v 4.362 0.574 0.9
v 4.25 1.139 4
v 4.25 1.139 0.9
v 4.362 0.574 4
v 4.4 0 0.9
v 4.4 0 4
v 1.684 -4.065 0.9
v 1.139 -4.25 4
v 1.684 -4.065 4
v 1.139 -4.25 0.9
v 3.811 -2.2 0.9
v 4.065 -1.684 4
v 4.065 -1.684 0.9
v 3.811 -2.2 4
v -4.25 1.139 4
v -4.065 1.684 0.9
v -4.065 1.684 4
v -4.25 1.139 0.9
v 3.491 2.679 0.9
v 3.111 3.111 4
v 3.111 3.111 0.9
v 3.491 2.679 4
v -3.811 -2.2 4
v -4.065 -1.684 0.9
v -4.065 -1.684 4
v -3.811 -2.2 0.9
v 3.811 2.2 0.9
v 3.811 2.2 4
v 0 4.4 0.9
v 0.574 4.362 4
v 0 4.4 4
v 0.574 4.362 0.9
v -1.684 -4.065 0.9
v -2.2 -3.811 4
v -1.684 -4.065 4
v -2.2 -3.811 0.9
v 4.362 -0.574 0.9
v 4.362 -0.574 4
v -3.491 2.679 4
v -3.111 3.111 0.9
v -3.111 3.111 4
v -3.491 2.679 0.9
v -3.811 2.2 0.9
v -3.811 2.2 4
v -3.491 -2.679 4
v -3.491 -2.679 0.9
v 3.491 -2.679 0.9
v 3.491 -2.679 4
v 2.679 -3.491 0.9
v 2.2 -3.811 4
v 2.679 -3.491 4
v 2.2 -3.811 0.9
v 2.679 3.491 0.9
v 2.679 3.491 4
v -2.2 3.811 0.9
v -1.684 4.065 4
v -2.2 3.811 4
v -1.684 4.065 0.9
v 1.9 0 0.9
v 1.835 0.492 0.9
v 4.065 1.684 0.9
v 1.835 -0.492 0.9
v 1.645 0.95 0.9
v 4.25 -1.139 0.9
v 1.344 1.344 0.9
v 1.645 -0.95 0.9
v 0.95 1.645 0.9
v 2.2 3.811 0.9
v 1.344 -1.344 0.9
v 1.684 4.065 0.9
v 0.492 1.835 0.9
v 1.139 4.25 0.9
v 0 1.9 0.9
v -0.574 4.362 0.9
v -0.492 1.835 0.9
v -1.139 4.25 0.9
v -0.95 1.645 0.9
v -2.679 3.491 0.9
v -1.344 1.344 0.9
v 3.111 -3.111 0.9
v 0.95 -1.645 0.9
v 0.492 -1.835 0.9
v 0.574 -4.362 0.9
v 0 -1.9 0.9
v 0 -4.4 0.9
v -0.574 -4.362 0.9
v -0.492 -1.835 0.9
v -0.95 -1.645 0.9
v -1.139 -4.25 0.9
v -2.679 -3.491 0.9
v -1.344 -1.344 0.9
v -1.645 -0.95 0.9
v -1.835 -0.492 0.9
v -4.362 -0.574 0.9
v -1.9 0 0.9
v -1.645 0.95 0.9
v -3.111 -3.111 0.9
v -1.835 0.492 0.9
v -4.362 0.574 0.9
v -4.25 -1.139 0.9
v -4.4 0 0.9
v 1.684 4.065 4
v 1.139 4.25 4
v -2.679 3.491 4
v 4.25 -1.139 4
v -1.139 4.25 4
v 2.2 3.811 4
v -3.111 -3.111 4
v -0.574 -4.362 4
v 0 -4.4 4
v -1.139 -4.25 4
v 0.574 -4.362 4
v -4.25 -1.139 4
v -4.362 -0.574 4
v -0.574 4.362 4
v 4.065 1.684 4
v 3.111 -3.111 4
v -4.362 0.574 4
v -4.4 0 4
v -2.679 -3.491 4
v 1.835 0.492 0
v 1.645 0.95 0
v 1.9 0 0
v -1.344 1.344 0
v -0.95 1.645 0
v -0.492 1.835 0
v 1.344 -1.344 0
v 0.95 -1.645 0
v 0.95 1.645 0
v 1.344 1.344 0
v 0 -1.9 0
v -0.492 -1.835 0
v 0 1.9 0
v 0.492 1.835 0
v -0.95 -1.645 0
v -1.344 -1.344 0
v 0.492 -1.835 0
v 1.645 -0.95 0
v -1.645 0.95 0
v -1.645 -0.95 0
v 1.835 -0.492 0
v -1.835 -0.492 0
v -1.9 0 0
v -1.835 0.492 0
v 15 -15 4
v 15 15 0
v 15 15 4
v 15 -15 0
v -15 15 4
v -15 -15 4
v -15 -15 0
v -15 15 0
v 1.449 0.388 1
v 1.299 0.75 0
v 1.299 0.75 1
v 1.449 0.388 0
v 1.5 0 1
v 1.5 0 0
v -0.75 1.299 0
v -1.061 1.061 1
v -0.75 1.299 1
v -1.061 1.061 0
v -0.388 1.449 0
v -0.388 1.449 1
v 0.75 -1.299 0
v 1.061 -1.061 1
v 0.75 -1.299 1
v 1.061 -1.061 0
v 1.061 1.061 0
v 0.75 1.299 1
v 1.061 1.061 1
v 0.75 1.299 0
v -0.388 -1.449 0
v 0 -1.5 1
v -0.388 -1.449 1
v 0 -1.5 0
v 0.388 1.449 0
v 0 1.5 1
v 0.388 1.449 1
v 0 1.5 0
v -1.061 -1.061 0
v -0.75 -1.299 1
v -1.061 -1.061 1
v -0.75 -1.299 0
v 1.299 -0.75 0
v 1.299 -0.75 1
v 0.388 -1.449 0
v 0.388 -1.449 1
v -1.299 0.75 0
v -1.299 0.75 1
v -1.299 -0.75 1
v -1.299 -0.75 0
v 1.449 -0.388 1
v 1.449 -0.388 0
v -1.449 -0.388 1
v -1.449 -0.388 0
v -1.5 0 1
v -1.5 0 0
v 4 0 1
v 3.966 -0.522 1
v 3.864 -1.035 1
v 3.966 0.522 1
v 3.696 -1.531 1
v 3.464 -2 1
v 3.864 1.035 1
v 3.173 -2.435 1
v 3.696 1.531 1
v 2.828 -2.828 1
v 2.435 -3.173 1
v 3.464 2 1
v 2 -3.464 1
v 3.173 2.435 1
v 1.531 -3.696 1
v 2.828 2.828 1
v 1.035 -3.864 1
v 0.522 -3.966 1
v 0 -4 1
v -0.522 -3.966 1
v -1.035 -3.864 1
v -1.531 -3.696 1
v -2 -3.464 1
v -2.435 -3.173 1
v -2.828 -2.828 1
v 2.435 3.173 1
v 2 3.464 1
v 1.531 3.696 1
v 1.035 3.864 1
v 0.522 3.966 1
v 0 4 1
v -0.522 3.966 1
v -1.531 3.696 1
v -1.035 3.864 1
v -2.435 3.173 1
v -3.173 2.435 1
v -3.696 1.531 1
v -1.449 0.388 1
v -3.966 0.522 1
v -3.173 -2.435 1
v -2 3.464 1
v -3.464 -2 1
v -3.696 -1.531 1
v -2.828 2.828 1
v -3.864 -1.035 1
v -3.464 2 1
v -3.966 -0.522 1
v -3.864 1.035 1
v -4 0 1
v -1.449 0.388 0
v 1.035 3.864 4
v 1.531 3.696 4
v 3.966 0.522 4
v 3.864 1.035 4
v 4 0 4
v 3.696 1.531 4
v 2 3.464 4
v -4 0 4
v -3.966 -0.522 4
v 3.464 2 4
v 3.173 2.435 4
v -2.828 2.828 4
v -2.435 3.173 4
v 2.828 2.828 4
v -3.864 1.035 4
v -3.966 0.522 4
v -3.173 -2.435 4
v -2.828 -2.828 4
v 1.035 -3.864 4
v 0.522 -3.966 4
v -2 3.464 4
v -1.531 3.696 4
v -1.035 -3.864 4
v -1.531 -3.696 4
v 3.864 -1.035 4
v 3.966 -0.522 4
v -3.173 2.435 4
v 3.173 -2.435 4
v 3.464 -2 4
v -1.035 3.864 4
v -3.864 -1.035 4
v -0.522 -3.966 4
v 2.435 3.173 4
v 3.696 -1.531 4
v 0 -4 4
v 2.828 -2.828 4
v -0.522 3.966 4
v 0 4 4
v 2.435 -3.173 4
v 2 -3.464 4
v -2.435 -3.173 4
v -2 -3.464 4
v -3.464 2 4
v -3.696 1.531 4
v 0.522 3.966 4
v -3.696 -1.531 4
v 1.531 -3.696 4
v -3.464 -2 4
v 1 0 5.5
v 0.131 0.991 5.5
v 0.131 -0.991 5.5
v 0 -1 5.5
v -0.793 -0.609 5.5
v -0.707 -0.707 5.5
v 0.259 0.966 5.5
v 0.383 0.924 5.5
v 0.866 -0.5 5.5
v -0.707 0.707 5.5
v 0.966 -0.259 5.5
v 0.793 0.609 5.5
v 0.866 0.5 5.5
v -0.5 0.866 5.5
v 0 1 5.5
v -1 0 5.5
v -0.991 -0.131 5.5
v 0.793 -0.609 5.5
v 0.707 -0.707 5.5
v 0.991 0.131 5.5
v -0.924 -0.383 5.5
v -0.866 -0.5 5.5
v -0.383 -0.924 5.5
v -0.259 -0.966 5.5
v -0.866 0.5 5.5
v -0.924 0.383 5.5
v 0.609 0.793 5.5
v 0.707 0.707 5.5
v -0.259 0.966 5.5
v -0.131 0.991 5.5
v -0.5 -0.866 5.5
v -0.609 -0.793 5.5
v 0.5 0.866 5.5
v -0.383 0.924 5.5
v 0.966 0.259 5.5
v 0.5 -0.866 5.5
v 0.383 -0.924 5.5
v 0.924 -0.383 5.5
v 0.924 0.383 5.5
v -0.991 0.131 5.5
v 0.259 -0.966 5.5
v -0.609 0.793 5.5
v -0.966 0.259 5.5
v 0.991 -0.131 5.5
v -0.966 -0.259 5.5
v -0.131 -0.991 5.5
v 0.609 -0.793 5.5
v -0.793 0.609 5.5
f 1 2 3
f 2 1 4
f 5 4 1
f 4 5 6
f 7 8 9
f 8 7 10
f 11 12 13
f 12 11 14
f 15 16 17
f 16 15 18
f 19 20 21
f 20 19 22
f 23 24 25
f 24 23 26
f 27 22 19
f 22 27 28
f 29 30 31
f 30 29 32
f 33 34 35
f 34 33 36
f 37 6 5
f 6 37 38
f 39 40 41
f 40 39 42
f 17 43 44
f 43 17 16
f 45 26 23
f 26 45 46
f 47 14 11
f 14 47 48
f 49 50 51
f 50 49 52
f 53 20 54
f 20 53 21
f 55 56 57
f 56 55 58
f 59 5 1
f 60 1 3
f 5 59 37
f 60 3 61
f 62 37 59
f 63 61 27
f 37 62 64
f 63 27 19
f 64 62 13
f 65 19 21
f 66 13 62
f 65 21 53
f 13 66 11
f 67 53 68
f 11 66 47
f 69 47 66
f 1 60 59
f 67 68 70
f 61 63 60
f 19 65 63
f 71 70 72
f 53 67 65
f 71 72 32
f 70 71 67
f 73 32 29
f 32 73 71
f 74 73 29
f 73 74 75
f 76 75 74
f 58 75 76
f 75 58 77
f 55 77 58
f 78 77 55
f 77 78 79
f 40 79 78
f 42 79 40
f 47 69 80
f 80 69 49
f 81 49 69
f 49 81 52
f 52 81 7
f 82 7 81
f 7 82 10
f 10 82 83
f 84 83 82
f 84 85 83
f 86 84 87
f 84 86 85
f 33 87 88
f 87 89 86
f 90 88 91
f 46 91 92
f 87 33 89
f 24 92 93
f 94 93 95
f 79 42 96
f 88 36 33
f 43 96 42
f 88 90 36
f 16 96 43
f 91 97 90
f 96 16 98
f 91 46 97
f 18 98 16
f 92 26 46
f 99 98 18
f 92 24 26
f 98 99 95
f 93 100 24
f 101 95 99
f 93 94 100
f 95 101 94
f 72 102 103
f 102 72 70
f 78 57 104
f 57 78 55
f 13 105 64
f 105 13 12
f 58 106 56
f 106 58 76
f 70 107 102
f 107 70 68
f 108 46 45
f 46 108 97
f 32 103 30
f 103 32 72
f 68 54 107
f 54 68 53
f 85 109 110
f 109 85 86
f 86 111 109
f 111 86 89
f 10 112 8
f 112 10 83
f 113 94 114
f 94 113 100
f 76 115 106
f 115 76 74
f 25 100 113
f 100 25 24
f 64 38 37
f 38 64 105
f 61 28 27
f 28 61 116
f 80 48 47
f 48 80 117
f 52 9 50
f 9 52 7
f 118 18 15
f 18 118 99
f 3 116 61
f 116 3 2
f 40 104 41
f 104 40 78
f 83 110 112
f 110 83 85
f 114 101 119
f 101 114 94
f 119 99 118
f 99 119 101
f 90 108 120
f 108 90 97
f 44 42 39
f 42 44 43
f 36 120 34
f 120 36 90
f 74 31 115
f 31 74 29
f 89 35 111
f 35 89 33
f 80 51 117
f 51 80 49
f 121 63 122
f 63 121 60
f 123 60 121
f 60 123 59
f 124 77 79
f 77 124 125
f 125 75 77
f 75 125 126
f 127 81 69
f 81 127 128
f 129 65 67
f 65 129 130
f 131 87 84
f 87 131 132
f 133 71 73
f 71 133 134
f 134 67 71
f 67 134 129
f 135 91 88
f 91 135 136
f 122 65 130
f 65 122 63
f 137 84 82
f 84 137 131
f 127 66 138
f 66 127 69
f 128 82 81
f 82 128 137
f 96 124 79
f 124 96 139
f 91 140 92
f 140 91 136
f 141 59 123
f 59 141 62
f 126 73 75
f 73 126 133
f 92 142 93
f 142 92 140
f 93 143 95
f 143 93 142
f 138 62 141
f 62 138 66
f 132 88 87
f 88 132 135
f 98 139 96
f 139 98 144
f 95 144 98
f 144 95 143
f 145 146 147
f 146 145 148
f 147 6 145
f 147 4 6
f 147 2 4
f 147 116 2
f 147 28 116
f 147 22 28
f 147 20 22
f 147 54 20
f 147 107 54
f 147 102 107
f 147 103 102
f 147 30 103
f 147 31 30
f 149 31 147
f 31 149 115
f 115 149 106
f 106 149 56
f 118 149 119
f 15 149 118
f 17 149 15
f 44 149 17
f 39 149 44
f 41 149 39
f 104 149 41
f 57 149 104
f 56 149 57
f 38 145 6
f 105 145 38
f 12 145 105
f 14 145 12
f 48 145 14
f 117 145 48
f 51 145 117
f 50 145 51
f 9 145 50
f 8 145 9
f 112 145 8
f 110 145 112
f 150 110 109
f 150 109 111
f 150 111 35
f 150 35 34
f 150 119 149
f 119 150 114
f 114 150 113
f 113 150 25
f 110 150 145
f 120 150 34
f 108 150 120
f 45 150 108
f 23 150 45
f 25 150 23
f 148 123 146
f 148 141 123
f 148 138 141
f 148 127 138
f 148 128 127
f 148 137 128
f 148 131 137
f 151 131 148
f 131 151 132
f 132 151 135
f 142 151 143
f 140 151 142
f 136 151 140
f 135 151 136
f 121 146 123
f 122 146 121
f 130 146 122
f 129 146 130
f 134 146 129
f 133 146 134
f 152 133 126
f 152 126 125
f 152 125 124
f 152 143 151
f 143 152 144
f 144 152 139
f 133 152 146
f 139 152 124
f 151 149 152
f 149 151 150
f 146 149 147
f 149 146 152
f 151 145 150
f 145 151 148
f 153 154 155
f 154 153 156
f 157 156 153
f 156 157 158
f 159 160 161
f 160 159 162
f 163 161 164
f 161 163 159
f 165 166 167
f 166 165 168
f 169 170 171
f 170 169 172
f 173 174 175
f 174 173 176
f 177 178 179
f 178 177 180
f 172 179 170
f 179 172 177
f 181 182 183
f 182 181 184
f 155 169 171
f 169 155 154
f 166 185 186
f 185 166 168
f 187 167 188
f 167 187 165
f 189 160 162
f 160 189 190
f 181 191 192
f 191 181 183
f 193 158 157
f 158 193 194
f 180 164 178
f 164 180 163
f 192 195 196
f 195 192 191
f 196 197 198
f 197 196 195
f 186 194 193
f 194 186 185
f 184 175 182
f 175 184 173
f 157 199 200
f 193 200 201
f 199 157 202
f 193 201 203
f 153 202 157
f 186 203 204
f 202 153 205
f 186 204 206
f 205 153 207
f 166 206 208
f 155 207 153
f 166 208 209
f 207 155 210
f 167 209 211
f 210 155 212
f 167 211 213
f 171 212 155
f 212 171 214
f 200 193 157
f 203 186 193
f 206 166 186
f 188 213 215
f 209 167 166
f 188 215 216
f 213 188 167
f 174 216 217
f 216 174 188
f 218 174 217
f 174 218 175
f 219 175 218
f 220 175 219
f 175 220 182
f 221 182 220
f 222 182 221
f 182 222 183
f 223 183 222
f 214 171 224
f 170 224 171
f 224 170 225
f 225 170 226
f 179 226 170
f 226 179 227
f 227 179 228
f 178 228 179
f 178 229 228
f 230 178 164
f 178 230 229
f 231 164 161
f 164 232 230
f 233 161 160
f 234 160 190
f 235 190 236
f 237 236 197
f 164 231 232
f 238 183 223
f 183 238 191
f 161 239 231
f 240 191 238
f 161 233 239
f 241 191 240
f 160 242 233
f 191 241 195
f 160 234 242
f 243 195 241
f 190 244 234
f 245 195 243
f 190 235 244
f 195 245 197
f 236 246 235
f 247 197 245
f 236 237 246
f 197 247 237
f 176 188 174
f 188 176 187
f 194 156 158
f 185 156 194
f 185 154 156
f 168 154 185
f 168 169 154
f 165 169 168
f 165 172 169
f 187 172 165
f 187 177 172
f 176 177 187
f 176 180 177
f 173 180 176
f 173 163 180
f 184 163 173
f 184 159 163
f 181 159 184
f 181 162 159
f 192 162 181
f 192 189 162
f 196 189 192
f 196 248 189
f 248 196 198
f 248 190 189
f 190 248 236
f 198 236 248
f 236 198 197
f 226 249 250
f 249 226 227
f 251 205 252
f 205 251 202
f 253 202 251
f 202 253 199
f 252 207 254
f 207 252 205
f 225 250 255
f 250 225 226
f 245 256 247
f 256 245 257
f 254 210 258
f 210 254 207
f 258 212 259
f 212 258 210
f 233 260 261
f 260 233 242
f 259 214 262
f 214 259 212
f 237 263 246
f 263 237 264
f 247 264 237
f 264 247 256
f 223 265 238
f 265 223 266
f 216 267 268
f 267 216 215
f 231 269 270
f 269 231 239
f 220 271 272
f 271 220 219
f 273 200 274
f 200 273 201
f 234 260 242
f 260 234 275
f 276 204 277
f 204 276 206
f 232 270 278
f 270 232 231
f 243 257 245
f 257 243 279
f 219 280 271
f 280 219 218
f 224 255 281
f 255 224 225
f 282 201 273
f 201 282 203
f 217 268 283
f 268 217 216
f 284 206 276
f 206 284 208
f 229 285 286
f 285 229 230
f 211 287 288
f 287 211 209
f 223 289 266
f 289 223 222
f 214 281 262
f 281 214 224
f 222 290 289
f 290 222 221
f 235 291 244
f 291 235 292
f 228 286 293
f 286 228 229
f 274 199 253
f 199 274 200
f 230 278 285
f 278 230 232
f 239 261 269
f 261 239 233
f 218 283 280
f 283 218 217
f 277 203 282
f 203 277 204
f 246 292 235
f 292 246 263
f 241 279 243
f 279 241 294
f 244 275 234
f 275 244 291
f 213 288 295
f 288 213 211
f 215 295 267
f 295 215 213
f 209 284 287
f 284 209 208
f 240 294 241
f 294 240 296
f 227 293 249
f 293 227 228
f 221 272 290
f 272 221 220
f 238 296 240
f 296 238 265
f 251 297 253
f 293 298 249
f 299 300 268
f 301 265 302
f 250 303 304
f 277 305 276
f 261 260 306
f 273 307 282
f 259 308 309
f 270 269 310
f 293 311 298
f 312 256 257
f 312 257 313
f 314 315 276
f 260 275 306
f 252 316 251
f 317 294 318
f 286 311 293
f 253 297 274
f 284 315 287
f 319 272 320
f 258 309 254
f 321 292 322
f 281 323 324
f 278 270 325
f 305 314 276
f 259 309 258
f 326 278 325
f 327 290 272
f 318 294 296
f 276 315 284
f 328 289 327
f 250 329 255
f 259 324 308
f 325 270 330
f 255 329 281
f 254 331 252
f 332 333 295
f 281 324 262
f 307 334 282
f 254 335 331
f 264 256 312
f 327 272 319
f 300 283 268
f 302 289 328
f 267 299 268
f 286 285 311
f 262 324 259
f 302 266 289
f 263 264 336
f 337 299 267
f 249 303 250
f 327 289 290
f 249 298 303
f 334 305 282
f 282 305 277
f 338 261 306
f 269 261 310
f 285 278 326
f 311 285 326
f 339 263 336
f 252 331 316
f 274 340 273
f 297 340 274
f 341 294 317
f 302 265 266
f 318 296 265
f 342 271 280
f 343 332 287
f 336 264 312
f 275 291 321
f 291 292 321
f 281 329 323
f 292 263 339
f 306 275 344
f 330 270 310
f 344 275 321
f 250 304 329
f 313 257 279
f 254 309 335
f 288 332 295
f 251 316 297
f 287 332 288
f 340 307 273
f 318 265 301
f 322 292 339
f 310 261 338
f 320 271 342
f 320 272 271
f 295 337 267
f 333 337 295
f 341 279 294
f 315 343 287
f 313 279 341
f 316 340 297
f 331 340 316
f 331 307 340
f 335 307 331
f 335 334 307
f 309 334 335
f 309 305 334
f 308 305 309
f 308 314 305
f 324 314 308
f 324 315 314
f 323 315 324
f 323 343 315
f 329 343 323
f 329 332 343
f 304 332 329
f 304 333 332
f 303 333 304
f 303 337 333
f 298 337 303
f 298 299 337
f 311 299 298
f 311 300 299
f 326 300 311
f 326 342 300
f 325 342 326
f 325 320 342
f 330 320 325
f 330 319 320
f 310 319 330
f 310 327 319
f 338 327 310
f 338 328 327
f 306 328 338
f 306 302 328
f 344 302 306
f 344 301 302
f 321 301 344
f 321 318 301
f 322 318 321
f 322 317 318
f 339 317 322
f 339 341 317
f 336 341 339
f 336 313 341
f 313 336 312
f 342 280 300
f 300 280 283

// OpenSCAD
// file: ../magic_cross_8_hook.scad
// マジッククロス8シリーズ Jフック ライブラリ
//
// フィットチェック用モデルと取り付け穴モジュールを提供
// 賃貸でも使えるフック「マジッククロス8」シリーズのJフック用
//
// 依存: なし
//
// 設計上の注意:
// - このフックは3Dプリント構造を介して実際の壁に取り付ける想定
// - 3Dプリント構造: 本体を収める凹み + 針が通る貫通穴
// - 実際の壁: 構造の裏側、針が刺さる壁
// - 座標系は穴の向き（Z-方向に掘る）に合わせて設計
// - 構造の最小厚 = body_depth + needle_h

/* 寸法定数 */
j_hook_body_d = 8;           // メイン円柱直径
j_hook_body_h = 3;           // メイン円柱高さ
j_hook_cone_h = 1.5;         // 円錐高さ
j_hook_cone_top_d = 2;       // 円錐上面直径
j_hook_needle_d = 3;         // 針出口直径
j_hook_needle_h = 1;         // 針出口高さ（突出量）
j_hook_cover_thickness = 1;  // 純正カバーの厚さ（壁方向）
j_hook_cover_h = 5;          // 純正カバーの高さ（本体底面から）

/* 公差 */
// 3Dプリント公差: 水平面 0.3mm、垂直面 0.4-0.5mm 推奨
default_tolerance = 0.4;  // 垂直壁への穴を想定

// Jフックモデル（フィットチェック用）
//
// 原点: 本体底面中心（壁表面に接する面）
// Z+方向: 本体 → 円錐（部屋内側へ）
// Z-方向: 針出口（壁穴の中へ）
//
// 層構成:
//   Z=-1〜0: 針出口（壁穴に入る）
//   Z=0〜3: メイン円柱（壁表面から上）
//   Z=3〜4.5: 円錐
module magic_cross_8_j_hook() {
    color("LightGray") {
        // 底部針出口（壁穴に入る部分、Z-方向）
        translate([0, 0, -j_hook_needle_h])
            cylinder(h = j_hook_needle_h, d = j_hook_needle_d, $fn = 24);

        // メイン円柱
        cylinder(h = j_hook_body_h, d = j_hook_body_d, $fn = 48);

        // 上部円錐
        translate([0, 0, j_hook_body_h])
            cylinder(h = j_hook_cone_h,
                     d1 = j_hook_body_d,
                     d2 = j_hook_cone_top_d,
                     $fn = 48);
    }
}

// Jフック + カバー モデル（フィットチェック用）
//
// カバーは本体と円錐を覆う（高さ5mm、厚さ1mm）
module magic_cross_8_j_hook_with_cover() {
    // フック本体
    magic_cross_8_j_hook();

    // カバー（本体と円錐を覆う円筒）
    cover_d = j_hook_body_d + j_hook_cover_thickness * 2;
    color("White")
        difference() {
            cylinder(h = j_hook_cover_h, d = cover_d, $fn = 48);
            // 内側をくり抜き（フック本体が入る）
            translate([0, 0, -0.1])
                cylinder(h = j_hook_cover_h + 0.2, d = j_hook_body_d, $fn = 48);
        }
}

// Jフック用穴（取り付け穴）
//
// 原点: 壁表面（Z=0）、穴はZ-方向に掘られる
// body_depth: 本体埋め込み深さ（デフォルトは本体高さ）
// wall_thickness: 壁厚（針穴の貫通用）
// cover_thickness: カバー厚（0=カバーなし、1=純正カバー）
//
// 構造:
//   壁表面 → 本体用凹み(8mm or 10mm) → 針用穴(3mm) → 壁裏面
module magic_cross_8_j_hook_hole(
    tolerance = default_tolerance,
    body_depth = j_hook_body_h,
    wall_thickness = 5,
    cover_thickness = 0
) {
    // 凹みの直径（カバー厚を考慮）
    recess_d = j_hook_body_d + cover_thickness * 2 + tolerance * 2;

    // 本体埋め込み用凹み
    translate([0, 0, -body_depth - 0.1])
        cylinder(h = body_depth + 0.2,
                 d = recess_d,
                 $fn = 48);

    // 針出口用貫通穴
    translate([0, 0, -wall_thickness - 0.1])
        cylinder(h = wall_thickness + 0.2,
                 d = j_hook_needle_d + tolerance * 2,
                 $fn = 24);
}

// スタンドアロン実行時のプレビュー
// show_wall が未定義 = 単体で開いている
if (is_undef(show_wall)) {
    magic_cross_8_j_hook();
}
// main file
// Jフック穴デモ
//
// マジッククロス8 Jフック用の穴を持つサンプル壁
// フィットチェック用にJフックモデルを表示可能
//
// 外形: 30mm x 30mm x 壁厚
//
// ビルド:
//   openscad -o j_hook_hole_demo.stl j_hook_hole_demo.scad

include <../magic_cross_8_hook.scad>

/* [表示設定] */
show_wall = true;
show_hook = true;       // フィットチェック用

/* [壁設定] */
wall_width = 30;        // [20:5:50]
wall_height = 30;       // [20:5:50]
// 基本壁厚は body_depth + needle_h (= 4mm) 以上が必要
wall_thickness = 4;     // [4:0.5:10]

/* [穴設定] */
// 3Dプリント公差（垂直面は0.4-0.5mm推奨）
hole_tolerance = 0.4;   // [0.2:0.05:0.6]
// 本体埋め込み深さ（フック本体高さ3mm）
body_depth = 3;         // [1:0.5:5]
// 純正カバーを使用する場合はtrue
use_cover = false;

/* 実装 */

// 座標系:
//   Z=0: 構造底面 = 針穴底 = 実際の壁に接する面
//   Z=needle_h: 針穴上端 = 本体凹み底
//   Z=needle_h + body_depth: 本体凹み上端 = 構造表面（カバーなし時）
//   Z=needle_h + cover_h: 構造表面（カバーあり時、カバー上端と一致）

// カバー用の追加厚さ = カバー高さ - 本体深さ
cover_extra = j_hook_cover_h - body_depth;  // 5 - 3 = 2mm
effective_thickness = j_hook_needle_h + body_depth + (use_cover ? cover_extra : 0);

// サンプル壁（穴付き）
module sample_wall() {
    difference() {
        // 壁本体
        translate([-wall_width/2, -wall_height/2, 0])
            cube([wall_width, wall_height, effective_thickness]);

        // Jフック固定穴（本体凹み + 針穴貫通）
        // wall_thickness: 針穴が貫通する深さ（カバー有無に関係なく needle_h + body_depth）
        translate([0, 0, effective_thickness])
            magic_cross_8_j_hook_hole(
                tolerance = hole_tolerance,
                body_depth = body_depth,
                wall_thickness = j_hook_needle_h + body_depth,
                cover_thickness = use_cover ? j_hook_cover_thickness : 0
            );
    }
}

// 組み立て
if (show_wall) {
    color("WhiteSmoke")
        sample_wall();
}

if (show_hook) {
    // フックを配置（フィットチェック用）
    // Z=0: 針出口底面（実際の壁に接する）
    // Z=needle_h: 本体底面（凹み底に接する）
    translate([0, 0, j_hook_needle_h])
        if (use_cover)
            magic_cross_8_j_hook_with_cover();
        else
            magic_cross_8_j_hook();
}
